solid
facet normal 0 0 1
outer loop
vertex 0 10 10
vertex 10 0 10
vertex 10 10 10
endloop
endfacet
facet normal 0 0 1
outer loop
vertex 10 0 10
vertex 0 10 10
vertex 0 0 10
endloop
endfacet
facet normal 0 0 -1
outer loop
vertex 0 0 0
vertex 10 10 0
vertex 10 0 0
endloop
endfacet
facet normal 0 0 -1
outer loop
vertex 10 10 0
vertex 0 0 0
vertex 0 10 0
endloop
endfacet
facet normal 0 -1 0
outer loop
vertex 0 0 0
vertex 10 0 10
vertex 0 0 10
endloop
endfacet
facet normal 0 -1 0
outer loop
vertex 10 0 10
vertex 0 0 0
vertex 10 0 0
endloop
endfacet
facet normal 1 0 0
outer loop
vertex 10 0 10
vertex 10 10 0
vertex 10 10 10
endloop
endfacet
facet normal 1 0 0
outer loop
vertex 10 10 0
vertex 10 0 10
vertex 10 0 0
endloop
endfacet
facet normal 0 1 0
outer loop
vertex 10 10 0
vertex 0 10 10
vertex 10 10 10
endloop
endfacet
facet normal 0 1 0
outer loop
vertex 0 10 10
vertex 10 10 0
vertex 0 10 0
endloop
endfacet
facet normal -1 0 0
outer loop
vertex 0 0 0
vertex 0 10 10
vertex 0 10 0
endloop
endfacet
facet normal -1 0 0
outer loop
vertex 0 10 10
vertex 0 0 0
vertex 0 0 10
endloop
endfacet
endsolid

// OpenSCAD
// examples/example.scad

// Define default values
width = 10;
height = 10;
depth = 10;

module model()
{
    // Example: A customizable cube
    cube([ width, height, depth ]);
}

// Call the model
model();
